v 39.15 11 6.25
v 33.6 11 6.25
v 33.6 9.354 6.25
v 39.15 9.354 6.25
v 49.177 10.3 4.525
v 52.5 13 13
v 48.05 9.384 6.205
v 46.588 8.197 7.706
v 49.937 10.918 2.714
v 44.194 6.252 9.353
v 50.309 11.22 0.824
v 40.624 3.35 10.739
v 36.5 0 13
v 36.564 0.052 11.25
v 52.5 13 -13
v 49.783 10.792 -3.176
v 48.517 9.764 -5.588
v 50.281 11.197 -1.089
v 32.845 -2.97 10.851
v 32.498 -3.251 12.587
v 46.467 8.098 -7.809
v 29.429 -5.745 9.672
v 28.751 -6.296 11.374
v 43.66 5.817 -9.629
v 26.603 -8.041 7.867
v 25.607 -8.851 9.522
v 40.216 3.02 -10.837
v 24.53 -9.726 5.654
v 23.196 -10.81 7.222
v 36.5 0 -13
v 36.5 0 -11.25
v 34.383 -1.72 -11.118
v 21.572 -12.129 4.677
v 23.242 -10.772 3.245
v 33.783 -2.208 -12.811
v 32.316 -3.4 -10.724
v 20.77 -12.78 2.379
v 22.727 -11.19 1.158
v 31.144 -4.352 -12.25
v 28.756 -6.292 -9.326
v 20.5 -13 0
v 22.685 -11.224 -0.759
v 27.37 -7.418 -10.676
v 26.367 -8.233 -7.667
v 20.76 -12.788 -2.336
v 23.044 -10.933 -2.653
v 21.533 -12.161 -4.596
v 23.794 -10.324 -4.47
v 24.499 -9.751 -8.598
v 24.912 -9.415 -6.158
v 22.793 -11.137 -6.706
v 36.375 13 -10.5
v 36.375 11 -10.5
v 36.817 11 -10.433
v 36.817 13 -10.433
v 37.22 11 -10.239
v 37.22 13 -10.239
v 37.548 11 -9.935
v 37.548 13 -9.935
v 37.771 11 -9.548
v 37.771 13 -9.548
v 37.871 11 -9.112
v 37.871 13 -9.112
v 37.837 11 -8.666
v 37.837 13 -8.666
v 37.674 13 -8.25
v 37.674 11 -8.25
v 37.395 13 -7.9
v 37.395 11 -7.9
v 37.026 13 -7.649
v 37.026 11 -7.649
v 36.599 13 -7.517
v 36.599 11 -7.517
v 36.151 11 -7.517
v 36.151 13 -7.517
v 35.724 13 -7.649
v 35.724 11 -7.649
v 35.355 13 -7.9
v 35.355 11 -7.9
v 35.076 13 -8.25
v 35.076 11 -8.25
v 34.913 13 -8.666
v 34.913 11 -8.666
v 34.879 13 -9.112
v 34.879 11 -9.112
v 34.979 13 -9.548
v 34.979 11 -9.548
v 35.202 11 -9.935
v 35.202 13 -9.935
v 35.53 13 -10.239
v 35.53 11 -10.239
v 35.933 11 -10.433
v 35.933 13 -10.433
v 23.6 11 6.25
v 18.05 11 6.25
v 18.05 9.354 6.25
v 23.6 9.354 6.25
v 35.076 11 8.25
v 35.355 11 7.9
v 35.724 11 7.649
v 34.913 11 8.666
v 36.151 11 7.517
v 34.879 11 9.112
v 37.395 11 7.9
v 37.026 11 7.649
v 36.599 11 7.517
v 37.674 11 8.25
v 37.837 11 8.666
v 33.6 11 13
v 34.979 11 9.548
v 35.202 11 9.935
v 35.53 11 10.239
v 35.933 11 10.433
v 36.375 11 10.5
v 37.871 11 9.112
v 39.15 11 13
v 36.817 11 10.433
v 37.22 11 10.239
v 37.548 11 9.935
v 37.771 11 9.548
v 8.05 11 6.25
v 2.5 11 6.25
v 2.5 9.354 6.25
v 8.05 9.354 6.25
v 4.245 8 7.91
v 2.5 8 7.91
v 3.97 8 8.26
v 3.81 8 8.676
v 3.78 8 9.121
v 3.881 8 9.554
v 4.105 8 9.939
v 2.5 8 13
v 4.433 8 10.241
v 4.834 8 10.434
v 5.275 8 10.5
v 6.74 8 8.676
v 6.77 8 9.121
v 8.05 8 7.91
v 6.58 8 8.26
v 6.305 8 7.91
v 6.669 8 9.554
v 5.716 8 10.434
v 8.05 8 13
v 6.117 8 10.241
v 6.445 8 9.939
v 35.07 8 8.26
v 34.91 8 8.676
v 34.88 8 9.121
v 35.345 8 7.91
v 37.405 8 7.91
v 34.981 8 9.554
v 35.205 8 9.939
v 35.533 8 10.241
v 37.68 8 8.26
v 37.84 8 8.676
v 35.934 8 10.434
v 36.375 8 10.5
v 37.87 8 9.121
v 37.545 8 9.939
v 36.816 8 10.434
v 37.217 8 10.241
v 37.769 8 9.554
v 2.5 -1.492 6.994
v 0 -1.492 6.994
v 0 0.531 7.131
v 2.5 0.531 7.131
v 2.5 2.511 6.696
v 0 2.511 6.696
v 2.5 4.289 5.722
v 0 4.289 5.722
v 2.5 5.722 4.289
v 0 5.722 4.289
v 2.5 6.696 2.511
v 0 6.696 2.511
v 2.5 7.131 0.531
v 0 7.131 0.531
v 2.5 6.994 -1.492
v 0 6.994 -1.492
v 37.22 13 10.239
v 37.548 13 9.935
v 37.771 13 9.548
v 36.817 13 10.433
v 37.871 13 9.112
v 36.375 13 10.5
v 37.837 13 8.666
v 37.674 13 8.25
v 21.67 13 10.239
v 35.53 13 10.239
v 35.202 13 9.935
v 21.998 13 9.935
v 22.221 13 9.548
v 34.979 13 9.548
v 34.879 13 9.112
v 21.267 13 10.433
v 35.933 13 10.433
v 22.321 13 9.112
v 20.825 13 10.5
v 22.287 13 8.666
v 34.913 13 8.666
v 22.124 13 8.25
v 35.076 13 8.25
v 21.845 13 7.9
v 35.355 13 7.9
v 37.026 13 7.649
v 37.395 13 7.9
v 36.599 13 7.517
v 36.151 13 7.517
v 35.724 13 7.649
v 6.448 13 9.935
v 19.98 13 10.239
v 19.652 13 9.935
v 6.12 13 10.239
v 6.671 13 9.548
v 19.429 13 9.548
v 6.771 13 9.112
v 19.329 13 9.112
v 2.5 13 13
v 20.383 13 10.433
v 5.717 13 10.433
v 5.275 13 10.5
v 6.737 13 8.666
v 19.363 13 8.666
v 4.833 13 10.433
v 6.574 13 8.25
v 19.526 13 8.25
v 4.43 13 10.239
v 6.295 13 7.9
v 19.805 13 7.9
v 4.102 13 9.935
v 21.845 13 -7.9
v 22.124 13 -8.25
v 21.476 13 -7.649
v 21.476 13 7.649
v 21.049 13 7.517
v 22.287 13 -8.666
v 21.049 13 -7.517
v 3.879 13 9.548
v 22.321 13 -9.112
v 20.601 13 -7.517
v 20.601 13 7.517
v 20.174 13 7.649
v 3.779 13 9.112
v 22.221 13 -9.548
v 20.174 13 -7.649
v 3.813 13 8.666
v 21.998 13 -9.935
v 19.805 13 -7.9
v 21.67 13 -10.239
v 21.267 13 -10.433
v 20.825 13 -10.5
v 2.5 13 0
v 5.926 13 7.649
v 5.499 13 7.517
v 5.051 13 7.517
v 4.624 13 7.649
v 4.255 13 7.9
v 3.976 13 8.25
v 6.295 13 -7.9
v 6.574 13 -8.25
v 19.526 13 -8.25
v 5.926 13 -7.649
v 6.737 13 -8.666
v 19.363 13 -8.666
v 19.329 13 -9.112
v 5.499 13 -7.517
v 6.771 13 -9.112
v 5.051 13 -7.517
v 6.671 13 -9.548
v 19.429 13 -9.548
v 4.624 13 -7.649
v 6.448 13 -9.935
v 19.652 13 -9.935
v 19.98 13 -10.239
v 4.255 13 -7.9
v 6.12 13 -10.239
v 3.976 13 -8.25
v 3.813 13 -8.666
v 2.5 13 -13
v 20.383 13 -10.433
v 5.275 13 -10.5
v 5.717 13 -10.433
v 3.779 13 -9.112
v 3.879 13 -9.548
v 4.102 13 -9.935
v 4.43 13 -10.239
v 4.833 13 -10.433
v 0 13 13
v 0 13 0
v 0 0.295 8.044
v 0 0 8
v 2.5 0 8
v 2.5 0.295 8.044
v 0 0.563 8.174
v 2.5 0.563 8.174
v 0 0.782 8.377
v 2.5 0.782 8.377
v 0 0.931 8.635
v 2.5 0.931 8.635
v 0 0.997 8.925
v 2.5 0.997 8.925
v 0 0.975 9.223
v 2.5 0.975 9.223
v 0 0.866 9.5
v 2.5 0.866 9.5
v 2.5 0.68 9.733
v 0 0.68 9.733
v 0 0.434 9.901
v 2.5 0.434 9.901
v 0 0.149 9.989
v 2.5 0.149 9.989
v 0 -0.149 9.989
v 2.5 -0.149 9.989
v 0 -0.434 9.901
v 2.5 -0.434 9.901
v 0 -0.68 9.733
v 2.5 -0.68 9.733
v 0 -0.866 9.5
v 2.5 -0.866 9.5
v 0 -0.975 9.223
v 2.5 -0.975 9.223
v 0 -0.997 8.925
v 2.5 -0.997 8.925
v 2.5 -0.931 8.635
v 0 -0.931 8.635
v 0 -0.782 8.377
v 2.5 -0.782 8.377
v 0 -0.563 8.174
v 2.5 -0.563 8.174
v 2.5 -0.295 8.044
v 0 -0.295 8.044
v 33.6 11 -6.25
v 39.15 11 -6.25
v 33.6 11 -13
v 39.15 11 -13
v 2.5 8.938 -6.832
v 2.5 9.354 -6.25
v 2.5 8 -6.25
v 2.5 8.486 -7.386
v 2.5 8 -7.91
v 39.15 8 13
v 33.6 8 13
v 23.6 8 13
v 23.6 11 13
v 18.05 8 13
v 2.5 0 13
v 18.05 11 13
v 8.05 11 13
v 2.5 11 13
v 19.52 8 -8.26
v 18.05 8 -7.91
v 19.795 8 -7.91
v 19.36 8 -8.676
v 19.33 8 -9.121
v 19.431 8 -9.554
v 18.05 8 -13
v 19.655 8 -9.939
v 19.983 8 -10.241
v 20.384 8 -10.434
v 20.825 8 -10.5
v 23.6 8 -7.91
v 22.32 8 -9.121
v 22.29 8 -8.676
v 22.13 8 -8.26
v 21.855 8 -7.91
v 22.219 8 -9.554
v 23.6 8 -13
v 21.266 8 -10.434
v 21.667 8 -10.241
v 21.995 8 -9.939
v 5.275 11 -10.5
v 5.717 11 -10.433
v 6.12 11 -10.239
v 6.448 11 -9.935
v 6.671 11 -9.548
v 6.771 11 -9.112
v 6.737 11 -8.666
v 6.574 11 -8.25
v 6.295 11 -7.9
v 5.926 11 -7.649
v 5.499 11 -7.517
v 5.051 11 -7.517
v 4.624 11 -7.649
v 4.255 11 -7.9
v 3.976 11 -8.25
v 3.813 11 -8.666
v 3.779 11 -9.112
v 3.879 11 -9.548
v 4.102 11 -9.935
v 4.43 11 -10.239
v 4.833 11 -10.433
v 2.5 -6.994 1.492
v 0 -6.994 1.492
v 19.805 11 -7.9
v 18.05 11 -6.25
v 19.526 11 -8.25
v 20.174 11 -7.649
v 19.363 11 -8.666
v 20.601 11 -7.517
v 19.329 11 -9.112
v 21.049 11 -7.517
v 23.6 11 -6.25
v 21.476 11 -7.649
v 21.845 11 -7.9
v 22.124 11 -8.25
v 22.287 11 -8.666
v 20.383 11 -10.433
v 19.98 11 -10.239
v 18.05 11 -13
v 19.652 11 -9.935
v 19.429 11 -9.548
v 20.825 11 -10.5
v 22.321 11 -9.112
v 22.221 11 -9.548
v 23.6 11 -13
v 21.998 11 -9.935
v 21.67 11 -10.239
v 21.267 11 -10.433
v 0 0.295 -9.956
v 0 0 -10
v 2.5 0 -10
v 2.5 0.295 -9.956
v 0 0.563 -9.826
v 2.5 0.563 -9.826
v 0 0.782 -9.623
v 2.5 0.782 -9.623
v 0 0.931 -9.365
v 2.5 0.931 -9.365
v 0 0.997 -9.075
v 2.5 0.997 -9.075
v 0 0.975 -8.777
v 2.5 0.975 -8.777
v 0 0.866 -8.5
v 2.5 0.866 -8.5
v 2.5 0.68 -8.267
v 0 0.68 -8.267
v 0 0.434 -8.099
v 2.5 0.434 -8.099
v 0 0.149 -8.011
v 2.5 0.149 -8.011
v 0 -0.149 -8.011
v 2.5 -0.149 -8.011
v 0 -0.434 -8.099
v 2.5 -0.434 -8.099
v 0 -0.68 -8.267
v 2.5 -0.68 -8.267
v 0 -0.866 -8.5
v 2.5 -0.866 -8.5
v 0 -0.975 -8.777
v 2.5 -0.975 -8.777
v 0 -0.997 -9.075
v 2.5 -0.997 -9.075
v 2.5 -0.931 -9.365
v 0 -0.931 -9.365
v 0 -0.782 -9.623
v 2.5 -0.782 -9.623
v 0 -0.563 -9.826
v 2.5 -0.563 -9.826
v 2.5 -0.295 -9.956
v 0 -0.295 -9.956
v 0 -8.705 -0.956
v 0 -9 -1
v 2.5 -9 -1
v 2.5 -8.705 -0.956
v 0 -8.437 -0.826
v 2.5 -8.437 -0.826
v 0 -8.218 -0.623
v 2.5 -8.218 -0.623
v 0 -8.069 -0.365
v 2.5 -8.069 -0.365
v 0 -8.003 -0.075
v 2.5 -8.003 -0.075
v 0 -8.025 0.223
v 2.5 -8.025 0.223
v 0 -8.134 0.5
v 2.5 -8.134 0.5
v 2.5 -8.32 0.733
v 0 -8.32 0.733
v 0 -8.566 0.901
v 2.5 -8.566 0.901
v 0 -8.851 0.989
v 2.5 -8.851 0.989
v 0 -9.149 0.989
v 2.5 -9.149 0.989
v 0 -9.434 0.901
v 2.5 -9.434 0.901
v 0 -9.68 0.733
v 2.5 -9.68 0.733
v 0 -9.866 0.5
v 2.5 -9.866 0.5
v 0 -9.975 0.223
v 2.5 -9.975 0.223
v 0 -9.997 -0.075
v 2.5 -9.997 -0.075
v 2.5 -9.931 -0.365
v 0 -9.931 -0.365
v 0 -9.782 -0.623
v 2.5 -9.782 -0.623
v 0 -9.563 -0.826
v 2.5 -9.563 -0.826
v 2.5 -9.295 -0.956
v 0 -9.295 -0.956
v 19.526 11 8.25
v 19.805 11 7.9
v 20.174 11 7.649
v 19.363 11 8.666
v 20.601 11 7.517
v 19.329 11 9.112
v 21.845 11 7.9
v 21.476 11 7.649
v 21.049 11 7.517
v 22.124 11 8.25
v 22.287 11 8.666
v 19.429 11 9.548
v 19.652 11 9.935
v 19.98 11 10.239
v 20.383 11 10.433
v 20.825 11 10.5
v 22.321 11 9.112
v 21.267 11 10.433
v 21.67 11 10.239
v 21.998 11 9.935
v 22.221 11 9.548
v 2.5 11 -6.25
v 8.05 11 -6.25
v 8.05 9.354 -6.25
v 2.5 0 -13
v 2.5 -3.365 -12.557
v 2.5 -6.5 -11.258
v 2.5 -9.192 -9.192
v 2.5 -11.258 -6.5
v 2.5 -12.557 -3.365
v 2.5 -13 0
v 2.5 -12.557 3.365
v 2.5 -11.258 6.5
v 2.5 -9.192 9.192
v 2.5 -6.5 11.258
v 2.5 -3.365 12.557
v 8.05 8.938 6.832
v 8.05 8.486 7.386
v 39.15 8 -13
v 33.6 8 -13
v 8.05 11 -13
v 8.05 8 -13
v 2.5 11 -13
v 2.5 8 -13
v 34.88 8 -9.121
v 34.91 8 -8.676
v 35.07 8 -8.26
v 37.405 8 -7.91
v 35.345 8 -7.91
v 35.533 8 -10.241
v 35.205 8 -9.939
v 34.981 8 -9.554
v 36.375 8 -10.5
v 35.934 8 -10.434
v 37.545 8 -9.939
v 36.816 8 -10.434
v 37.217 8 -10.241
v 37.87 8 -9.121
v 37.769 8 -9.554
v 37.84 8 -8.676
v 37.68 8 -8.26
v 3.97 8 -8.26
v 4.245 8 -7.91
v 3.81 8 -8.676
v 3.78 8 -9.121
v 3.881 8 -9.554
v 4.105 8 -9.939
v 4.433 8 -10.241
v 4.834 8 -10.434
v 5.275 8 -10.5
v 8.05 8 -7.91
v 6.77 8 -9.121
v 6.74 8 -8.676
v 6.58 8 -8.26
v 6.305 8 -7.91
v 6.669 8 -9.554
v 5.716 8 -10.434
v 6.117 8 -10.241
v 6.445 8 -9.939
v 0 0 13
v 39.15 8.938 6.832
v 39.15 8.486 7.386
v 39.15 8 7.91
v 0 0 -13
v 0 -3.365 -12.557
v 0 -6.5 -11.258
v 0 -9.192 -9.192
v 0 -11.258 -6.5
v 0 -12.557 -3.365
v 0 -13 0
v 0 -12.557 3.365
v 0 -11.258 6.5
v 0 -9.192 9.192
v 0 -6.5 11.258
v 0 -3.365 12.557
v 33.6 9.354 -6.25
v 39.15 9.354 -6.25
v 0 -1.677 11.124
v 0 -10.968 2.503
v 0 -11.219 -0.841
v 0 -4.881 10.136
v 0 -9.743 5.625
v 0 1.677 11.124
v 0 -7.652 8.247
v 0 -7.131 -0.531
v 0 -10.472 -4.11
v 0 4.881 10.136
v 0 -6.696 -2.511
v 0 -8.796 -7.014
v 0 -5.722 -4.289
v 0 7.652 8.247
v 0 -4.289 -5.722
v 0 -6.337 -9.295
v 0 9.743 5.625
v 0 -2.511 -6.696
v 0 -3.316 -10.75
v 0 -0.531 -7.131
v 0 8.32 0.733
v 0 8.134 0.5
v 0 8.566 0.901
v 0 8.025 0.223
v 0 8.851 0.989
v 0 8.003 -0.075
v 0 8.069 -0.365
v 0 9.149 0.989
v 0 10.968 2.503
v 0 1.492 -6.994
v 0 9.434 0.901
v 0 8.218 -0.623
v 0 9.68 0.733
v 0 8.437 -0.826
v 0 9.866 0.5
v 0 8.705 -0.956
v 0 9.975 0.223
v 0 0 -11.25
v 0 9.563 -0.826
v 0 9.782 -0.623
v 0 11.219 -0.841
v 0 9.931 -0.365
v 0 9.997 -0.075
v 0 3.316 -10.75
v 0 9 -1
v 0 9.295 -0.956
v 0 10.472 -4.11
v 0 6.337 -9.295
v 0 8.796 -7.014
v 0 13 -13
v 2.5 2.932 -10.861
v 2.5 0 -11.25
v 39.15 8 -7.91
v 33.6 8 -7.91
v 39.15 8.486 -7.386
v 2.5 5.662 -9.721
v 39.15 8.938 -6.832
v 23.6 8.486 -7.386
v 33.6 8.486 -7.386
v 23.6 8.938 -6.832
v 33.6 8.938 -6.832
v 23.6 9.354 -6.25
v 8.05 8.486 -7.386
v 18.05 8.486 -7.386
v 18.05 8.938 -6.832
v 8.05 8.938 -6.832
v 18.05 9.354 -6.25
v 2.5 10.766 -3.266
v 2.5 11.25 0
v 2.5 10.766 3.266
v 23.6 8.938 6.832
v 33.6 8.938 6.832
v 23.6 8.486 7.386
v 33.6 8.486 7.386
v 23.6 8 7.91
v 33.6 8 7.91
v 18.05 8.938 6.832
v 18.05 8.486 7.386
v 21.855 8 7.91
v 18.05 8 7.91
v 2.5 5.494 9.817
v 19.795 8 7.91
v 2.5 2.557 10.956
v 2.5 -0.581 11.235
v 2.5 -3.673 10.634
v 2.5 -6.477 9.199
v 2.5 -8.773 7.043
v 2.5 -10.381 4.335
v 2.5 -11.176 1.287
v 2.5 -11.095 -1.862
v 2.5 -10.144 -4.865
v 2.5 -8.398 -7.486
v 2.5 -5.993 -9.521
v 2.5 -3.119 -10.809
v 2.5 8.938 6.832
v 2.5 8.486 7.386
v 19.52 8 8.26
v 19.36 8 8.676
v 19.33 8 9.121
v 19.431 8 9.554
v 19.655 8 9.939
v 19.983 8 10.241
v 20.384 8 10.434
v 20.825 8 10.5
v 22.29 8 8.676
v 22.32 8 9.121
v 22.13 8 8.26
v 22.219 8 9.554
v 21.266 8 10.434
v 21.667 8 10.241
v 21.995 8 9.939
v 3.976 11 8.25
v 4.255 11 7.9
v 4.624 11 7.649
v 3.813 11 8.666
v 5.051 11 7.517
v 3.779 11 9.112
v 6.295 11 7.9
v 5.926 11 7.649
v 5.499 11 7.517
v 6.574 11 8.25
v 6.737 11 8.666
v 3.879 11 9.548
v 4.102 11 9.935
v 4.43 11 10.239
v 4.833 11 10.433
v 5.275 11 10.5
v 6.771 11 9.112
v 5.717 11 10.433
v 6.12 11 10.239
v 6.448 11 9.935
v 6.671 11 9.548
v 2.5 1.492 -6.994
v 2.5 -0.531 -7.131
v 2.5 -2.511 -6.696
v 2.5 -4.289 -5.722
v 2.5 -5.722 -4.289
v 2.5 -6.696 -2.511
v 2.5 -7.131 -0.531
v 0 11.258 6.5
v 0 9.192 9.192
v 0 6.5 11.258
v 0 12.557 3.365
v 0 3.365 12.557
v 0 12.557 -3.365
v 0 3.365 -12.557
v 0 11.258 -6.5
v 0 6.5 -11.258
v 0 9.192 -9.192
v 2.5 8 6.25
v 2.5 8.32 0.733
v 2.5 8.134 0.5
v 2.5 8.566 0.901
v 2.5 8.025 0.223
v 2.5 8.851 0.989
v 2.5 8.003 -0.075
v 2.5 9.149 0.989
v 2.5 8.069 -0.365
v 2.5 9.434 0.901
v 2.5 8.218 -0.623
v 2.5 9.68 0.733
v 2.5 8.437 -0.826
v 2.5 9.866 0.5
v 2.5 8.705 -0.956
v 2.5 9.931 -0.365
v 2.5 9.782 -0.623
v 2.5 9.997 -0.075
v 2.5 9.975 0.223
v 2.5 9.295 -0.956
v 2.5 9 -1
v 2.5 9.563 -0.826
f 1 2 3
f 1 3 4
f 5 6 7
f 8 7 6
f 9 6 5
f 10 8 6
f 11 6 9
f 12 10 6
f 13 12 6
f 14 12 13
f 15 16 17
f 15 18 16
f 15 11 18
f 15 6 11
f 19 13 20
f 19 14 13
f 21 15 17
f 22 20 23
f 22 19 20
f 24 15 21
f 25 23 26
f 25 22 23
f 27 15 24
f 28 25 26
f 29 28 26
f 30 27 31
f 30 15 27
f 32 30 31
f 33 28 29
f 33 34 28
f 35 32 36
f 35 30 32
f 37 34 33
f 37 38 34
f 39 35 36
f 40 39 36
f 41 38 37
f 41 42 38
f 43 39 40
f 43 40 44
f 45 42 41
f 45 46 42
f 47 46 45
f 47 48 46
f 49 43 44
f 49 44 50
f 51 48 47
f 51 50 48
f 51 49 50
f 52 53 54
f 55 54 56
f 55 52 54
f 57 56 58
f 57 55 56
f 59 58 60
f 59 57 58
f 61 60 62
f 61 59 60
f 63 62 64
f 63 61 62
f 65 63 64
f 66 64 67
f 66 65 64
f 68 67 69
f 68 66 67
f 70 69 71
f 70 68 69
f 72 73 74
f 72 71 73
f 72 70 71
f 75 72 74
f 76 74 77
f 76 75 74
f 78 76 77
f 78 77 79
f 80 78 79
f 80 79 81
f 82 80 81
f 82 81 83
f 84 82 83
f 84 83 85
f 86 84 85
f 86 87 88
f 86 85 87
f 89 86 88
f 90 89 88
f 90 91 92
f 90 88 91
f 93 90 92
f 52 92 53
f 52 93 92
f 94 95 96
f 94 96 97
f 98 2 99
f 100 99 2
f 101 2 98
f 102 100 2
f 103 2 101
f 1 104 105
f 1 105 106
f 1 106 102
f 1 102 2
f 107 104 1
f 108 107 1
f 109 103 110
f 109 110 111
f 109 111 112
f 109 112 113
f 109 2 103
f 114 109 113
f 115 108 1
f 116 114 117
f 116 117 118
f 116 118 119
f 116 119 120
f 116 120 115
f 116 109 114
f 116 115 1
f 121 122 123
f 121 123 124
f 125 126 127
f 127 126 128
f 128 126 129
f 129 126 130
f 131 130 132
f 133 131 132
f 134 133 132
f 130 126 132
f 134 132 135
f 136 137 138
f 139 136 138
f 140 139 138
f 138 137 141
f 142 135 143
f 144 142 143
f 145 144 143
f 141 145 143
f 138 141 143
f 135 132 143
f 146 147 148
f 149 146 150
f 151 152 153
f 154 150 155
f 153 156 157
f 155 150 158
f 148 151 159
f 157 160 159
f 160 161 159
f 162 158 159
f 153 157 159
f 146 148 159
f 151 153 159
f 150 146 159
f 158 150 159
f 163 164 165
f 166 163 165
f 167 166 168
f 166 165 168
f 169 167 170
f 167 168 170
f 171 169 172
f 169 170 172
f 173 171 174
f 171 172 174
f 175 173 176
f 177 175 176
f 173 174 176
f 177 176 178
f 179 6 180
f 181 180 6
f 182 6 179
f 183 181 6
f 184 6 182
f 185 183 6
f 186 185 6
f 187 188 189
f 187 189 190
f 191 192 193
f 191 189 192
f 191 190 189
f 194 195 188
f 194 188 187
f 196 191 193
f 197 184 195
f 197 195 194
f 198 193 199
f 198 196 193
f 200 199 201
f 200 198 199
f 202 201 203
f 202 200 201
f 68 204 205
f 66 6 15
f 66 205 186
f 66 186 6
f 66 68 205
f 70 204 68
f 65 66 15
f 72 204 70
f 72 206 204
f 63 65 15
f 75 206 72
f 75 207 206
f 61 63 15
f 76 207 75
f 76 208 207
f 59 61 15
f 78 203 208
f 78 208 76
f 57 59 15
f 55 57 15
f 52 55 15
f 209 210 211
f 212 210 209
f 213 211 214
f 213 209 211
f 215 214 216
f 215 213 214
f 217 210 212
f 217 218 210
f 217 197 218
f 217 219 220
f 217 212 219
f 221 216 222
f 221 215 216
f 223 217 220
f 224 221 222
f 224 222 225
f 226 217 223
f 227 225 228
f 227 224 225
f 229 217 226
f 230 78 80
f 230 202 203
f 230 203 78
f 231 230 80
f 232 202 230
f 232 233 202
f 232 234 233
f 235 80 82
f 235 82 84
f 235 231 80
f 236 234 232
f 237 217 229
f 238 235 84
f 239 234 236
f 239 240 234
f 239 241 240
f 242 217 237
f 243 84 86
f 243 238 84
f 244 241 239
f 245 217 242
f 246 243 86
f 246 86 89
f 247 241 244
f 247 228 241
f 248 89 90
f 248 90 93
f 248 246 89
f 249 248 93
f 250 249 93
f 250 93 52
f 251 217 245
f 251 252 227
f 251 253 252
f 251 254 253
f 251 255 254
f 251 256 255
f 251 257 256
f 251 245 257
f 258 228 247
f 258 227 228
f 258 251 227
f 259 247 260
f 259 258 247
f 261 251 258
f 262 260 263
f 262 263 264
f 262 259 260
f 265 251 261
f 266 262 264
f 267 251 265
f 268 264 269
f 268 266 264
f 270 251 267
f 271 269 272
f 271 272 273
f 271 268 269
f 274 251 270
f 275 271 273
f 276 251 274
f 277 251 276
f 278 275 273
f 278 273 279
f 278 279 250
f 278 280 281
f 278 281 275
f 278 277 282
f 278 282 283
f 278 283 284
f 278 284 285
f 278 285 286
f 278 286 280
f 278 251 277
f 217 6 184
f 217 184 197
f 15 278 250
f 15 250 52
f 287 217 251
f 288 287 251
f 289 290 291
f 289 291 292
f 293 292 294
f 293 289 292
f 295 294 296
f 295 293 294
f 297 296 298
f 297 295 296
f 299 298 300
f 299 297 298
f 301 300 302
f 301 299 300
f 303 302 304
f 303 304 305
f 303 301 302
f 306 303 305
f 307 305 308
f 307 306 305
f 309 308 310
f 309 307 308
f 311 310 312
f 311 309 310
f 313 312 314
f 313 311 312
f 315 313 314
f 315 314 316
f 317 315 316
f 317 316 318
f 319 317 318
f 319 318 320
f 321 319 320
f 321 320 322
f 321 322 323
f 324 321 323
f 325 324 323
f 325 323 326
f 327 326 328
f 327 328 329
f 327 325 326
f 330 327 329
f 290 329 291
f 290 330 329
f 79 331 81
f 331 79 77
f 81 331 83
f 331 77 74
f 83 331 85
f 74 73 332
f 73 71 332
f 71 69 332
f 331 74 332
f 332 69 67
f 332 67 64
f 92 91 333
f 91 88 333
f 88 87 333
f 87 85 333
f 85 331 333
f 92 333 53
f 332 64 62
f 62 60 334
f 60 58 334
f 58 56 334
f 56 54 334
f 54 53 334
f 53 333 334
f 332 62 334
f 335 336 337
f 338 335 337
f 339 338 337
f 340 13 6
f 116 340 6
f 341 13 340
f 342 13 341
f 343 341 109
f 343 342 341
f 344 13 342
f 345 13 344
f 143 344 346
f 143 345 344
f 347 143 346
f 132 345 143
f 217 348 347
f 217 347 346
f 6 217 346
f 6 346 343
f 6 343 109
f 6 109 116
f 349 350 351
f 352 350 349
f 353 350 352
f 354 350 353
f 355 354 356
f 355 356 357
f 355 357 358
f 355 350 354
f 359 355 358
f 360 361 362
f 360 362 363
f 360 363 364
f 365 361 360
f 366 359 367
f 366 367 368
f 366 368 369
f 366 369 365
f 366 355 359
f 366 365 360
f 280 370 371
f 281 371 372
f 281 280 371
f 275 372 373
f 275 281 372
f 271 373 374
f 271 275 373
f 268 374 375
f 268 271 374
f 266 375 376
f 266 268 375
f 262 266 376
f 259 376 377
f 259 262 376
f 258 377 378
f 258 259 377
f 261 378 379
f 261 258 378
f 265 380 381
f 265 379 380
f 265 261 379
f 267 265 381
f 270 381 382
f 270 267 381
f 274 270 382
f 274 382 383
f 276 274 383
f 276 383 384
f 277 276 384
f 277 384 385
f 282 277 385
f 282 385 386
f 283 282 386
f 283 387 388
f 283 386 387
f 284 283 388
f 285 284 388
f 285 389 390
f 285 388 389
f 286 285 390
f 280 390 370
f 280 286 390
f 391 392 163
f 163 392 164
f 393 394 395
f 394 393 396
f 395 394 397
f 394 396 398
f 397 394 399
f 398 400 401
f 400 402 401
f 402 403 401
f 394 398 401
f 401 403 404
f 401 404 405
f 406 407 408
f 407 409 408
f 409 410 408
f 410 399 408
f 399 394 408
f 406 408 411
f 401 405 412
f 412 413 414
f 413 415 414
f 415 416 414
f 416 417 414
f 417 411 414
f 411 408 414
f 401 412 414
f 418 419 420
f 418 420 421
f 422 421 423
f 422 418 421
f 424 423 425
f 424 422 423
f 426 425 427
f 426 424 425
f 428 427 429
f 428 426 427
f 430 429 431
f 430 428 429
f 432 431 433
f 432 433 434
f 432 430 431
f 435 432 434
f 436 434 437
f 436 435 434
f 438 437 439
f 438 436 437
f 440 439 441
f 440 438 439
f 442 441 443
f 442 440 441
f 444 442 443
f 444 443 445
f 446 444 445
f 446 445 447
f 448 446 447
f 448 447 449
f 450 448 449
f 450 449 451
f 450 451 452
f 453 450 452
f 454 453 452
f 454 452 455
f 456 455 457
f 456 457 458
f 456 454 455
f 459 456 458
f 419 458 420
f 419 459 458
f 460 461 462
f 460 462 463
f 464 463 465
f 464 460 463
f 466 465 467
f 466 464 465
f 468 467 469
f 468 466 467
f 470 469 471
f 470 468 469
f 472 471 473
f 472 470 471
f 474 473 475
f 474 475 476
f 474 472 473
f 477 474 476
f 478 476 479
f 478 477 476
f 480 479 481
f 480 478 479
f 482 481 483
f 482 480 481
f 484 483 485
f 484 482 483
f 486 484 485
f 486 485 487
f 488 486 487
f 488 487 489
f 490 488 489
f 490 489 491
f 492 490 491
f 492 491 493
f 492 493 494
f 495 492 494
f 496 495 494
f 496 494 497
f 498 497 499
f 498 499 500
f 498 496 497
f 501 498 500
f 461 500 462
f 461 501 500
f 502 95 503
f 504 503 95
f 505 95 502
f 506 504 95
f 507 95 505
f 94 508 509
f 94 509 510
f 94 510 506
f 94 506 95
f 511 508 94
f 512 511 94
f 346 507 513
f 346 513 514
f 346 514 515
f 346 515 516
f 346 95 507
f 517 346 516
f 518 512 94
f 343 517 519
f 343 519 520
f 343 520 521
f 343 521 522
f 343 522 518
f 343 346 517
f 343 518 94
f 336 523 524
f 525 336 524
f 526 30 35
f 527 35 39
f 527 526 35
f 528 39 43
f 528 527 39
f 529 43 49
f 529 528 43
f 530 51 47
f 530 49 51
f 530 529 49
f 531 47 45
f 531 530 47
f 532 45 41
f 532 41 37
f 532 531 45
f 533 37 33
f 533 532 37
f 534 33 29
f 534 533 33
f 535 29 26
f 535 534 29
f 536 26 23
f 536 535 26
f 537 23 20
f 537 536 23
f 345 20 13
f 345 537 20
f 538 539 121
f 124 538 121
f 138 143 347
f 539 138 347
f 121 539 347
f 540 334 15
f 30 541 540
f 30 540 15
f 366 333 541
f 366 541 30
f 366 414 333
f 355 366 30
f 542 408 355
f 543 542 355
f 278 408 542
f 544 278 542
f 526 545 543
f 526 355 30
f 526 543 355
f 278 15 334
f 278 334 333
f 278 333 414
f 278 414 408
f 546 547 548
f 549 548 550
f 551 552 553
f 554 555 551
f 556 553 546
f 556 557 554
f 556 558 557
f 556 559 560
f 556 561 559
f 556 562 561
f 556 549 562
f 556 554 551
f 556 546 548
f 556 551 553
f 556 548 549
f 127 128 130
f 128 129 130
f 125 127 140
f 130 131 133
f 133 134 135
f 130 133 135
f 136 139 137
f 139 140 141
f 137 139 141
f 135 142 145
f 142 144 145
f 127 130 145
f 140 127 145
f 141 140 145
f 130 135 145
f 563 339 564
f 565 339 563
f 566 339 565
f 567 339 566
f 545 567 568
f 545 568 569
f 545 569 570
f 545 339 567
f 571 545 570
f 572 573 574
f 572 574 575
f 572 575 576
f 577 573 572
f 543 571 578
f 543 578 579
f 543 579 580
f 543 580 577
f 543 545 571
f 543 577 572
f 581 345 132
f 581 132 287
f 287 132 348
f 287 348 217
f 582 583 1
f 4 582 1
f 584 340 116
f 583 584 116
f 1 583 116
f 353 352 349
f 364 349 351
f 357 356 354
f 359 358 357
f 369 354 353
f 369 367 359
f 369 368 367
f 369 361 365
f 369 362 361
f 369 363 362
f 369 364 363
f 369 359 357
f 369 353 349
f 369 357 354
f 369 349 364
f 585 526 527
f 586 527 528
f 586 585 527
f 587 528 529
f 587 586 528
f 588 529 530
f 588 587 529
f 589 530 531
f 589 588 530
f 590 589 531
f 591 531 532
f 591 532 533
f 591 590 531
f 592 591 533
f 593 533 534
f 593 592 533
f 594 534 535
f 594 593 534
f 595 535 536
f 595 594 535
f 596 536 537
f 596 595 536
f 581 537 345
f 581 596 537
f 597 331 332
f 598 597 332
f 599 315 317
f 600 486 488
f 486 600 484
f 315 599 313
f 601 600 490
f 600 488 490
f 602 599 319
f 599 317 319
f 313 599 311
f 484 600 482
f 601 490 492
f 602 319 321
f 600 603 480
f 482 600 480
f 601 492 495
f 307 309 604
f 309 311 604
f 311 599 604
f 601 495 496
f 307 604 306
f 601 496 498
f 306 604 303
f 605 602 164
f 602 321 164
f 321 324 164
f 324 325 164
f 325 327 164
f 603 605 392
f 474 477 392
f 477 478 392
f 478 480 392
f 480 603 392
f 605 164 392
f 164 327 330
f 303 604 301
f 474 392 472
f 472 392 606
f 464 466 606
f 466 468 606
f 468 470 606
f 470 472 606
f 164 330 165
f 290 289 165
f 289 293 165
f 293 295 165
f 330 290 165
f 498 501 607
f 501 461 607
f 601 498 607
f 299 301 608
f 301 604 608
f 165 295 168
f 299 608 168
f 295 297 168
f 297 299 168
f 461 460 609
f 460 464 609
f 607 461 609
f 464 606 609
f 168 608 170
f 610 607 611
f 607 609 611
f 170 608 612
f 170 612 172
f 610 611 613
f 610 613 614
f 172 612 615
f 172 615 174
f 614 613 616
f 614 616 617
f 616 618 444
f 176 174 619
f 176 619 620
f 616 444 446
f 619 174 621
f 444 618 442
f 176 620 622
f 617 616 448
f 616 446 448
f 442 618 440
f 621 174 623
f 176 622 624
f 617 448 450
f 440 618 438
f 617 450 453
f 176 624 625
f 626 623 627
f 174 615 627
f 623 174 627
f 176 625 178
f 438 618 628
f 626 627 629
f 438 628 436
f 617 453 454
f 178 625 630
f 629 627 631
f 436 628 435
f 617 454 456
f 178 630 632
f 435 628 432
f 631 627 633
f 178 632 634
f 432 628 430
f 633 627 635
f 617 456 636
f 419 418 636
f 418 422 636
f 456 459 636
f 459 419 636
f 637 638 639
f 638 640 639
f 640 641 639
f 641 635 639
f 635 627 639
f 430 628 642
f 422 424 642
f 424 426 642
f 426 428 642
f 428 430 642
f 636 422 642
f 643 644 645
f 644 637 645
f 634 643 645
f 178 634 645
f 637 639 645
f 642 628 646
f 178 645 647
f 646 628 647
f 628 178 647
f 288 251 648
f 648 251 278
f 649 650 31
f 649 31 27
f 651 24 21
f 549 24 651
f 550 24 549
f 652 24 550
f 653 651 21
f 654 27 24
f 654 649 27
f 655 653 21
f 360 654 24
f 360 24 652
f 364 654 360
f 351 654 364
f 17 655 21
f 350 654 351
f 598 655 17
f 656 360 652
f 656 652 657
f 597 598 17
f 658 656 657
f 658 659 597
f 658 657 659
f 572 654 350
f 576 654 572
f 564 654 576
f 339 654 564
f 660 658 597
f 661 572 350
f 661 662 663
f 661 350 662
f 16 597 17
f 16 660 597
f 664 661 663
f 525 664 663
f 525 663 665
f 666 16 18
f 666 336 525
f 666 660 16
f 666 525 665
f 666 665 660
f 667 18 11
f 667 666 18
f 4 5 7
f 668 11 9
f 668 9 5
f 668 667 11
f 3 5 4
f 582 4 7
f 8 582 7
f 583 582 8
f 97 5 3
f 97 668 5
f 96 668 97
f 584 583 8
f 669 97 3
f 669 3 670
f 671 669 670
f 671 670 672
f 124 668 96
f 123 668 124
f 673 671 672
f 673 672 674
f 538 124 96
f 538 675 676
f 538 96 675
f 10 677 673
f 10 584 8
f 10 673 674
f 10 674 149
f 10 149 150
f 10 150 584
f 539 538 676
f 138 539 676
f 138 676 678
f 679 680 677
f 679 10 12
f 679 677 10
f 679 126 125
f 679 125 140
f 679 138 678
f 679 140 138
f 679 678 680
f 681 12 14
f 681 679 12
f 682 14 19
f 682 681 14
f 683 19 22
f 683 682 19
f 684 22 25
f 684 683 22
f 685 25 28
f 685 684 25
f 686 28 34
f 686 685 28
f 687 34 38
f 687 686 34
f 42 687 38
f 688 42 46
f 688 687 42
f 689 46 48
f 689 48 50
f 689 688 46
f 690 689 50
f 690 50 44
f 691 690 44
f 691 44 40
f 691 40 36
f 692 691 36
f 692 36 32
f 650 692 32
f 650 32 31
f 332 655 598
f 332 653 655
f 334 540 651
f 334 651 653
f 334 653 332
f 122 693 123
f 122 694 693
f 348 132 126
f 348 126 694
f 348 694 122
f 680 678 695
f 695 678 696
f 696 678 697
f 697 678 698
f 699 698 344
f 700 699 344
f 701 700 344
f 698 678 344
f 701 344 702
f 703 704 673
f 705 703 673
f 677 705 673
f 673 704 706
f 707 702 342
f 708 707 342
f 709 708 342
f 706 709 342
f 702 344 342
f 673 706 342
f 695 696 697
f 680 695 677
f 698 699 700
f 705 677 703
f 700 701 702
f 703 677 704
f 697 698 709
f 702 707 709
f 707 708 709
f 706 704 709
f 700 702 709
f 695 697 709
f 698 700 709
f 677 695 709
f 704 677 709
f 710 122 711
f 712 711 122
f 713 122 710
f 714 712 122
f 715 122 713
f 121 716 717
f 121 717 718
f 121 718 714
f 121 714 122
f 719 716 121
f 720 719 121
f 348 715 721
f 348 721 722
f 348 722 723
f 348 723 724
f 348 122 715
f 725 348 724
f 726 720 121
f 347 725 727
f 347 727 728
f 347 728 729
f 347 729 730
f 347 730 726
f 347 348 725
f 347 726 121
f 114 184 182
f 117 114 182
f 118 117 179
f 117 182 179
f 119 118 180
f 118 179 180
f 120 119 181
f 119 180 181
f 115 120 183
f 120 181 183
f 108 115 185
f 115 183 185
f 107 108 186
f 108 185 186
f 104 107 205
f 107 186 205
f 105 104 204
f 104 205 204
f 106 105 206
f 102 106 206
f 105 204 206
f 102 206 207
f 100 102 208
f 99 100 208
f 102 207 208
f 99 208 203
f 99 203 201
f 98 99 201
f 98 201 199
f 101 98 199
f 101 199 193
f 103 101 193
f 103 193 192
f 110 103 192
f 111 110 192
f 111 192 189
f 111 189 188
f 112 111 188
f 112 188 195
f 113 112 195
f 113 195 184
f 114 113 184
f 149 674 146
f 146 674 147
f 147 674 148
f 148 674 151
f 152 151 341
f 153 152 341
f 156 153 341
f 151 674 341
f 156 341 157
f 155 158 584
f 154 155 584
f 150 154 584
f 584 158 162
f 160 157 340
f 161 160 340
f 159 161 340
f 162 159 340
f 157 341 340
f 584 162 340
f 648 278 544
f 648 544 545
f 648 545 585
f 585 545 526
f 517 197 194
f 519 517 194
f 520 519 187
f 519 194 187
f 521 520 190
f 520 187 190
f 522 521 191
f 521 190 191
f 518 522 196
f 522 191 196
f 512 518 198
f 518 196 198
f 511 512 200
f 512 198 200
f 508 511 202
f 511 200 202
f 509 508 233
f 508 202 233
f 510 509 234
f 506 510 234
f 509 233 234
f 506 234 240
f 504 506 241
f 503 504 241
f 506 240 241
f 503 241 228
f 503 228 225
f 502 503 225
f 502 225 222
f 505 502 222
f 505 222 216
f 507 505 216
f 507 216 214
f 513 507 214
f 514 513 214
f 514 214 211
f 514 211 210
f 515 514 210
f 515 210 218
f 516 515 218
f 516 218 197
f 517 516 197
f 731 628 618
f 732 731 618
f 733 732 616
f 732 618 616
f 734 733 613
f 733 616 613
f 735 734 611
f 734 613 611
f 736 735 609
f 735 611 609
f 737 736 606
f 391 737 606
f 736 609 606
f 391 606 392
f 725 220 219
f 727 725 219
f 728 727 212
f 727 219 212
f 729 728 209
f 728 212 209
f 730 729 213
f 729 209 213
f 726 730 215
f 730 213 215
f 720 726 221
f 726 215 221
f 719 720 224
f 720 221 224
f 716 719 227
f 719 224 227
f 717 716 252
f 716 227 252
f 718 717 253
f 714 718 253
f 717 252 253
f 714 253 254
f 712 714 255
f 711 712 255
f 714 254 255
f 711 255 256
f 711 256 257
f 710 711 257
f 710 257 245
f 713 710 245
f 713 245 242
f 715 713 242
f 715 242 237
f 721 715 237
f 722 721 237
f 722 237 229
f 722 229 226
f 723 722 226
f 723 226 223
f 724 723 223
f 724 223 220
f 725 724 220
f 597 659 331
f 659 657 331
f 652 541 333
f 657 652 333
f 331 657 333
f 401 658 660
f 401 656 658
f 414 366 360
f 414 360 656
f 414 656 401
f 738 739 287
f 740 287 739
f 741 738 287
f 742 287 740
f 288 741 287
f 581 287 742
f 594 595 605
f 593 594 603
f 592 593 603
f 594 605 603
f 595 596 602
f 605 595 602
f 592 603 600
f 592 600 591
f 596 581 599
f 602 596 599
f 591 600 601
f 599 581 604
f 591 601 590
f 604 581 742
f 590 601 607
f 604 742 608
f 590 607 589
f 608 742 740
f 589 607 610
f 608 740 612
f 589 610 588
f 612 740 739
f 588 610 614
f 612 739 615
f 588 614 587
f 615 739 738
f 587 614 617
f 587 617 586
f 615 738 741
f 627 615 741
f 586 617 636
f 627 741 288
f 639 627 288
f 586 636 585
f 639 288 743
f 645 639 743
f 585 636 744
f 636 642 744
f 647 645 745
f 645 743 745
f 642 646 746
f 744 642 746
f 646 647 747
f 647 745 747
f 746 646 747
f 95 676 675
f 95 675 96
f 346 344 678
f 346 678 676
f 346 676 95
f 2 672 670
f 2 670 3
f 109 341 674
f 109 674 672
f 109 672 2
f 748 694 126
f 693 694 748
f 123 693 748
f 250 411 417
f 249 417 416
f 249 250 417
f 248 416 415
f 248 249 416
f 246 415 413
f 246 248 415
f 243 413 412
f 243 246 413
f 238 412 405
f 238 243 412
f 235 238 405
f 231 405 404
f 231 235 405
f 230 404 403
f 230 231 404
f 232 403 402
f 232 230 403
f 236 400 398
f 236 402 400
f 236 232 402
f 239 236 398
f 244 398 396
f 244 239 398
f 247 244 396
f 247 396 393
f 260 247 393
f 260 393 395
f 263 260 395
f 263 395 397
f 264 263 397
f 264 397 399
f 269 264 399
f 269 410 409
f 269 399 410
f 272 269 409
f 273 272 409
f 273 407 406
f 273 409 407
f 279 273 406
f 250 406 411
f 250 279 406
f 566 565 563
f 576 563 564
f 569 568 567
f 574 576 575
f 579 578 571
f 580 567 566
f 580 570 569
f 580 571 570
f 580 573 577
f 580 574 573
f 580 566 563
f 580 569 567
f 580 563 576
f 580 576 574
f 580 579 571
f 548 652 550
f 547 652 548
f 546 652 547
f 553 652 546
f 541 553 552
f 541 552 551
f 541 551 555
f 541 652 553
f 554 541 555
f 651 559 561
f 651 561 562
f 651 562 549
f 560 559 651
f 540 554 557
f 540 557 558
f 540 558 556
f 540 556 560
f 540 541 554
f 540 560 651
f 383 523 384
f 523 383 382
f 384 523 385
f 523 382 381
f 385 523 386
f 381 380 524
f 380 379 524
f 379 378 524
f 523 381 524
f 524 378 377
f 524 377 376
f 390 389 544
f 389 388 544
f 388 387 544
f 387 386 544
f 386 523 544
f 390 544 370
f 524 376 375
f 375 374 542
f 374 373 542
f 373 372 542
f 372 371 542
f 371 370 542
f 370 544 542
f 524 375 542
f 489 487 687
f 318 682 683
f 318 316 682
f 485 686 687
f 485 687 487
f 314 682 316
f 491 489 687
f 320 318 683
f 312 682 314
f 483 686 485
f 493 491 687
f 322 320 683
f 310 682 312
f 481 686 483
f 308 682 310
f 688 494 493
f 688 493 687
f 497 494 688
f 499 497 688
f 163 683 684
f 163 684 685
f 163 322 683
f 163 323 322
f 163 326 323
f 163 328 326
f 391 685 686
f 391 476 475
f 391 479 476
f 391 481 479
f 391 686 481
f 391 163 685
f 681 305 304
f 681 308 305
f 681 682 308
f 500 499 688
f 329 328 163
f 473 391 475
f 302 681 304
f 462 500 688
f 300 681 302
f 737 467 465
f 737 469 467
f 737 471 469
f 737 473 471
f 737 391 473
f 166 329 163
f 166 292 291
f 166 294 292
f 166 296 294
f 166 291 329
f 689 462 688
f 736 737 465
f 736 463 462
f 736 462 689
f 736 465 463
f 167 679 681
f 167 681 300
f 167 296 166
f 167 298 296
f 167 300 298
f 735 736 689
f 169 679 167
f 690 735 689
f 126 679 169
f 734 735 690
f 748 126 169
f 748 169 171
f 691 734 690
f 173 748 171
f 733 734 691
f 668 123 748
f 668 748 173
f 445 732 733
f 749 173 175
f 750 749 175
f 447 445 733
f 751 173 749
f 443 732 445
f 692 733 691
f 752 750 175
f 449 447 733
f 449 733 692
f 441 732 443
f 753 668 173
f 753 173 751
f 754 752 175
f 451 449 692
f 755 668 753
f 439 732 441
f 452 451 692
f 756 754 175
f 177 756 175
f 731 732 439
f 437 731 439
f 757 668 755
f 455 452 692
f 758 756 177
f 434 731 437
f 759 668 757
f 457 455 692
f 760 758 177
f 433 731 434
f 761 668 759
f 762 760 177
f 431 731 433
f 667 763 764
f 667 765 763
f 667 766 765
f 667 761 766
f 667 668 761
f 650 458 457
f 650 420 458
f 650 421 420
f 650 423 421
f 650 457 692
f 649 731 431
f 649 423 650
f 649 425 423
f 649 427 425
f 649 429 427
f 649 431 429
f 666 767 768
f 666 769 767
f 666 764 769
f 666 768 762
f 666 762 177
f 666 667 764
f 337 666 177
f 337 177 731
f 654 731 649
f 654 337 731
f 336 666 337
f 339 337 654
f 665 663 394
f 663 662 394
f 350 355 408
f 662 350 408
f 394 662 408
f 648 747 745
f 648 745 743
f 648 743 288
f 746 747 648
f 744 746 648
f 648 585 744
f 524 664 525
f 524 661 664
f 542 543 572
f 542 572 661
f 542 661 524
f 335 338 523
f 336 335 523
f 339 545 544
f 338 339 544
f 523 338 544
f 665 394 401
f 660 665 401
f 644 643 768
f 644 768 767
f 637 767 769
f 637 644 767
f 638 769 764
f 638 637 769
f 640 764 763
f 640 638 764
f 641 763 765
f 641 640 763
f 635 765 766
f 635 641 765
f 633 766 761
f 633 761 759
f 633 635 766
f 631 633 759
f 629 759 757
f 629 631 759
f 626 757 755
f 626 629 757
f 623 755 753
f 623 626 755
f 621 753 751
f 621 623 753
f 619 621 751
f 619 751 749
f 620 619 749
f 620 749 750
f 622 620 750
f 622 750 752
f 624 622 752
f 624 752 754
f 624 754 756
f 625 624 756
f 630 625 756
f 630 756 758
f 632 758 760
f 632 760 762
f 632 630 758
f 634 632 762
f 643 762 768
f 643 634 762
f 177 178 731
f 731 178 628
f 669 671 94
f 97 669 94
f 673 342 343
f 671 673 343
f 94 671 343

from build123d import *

# Parameters (mm, degrees)
SKETCH1_R                       = 13
SKETCH1_R_2                     = 1
BOSS_EXTRUDE1_DEPTH             = 2.5
SKETCH2_R                       = 11.25
BOSS_EXTRUDE2_DEPTH             = 50
BOSS_EXTRUDE2_DIRECTION_2_REACH = 20.554
CUT_EXTRUDE1_DEPTH              = 56.625983137
CUT_EXTRUDE1_DEPTH_BACK         = 56.625983137
SKETCH4_W                       = 5.55
SKETCH4_H                       = 3
CUT_EXTRUDE2_DEPTH              = 6.75
SKETCH5_R                       = 1.5
CUT_EXTRUDE3_DEPTH              = 5


with BuildPart() as part:
    # Sketch1 → Boss-Extrude1 (new body)
    with BuildSketch(Plane(origin=(0, 0, 0), x_dir=(0, 0, -1), z_dir=(1, 0, 0))):
        Circle(SKETCH1_R)
        with Locations((0, 9)):
            Circle(SKETCH1_R_2, mode=Mode.SUBTRACT)
        with Locations((9, 0)):
            Circle(SKETCH1_R_2, mode=Mode.SUBTRACT)
        with Locations((0, -9)):
            Circle(SKETCH1_R_2, mode=Mode.SUBTRACT)
        with Locations((-9, 0)):
            Circle(SKETCH1_R_2, mode=Mode.SUBTRACT)
        with BuildLine():
            Line((1.491573557, 6.993707817), (6.993707817, 1.491573557))
            ThreePointArc((6.993707817, 1.491573557), (5.056517611, -5.056517611), (-1.491573557, -6.993707817))
            Line((-1.491573557, -6.993707817), (-6.993707817, -1.491573557))
            ThreePointArc((-6.993707817, -1.491573557), (-5.056517611, 5.056517611), (1.491573557, 6.993707817))
        make_face(mode=Mode.SUBTRACT)
    extrude(amount=BOSS_EXTRUDE1_DEPTH)

    # Sketch2 → Boss-Extrude2 (add)
    with BuildSketch(Plane(origin=(2.5, 0, 0), x_dir=(0, 0, -1), z_dir=(1, 0, 0))):
        with BuildLine():
            Line((-13, 13), (13, 13))
            Line((13, 13), (13, 0))
            ThreePointArc((13, 0), (0, -13), (-13, 0))
            Line((-13, 0), (-13, 13))
        make_face()
        Circle(SKETCH2_R, mode=Mode.SUBTRACT)
    extrude(amount=BOSS_EXTRUDE2_DEPTH)

    # Boss-Extrude2 direction 2: up to this face of the body (flat: up to its plane)
    boss_extrude2_direction_2_end = Plane(part.part.faces().sort_by_distance((0, 0, 12.632304474))[0])
    # Sketch2 → Boss-Extrude2 direction 2 (add, up to the picked face)
    with BuildSketch(Plane(origin=(2.5, 0, 0), x_dir=(0, 0, -1), z_dir=(1, 0, 0)), mode=Mode.PRIVATE) as boss_extrude2_direction_2_sk1:
        with BuildLine():
            Line((-13, 13), (13, 13))
            Line((13, 13), (13, 0))
            ThreePointArc((13, 0), (0, -13), (-13, 0))
            Line((-13, 0), (-13, 13))
        make_face()
        Circle(SKETCH2_R, mode=Mode.SUBTRACT)
    boss_extrude2_direction_2_tool1 = split(extrude(boss_extrude2_direction_2_sk1.sketch, amount=-BOSS_EXTRUDE2_DIRECTION_2_REACH, mode=Mode.PRIVATE), bisect_by=boss_extrude2_direction_2_end, keep=Keep.BOTH, mode=Mode.PRIVATE)
    add(boss_extrude2_direction_2_tool1.solids().sort_by(Axis((2.5, 6.5, 12.632304), (-1, 0, 0)))[0])

    # Sketch3 → Cut-Extrude1 (cut, two sides: drawn at the far end of the back side and taken through both)
    with BuildSketch(Plane.XY.offset(-CUT_EXTRUDE1_DEPTH_BACK)):
        Polygon((52.5, 13), (20.5, -13), (52.5, -13), align=None)
    extrude(amount=CUT_EXTRUDE1_DEPTH + CUT_EXTRUDE1_DEPTH_BACK, mode=Mode.SUBTRACT)

    # Sketch4 → Cut-Extrude2 (cut)
    with BuildSketch(Plane.XY.offset(13)):
        with Locations((5.275, 9.5)):
            Rectangle(SKETCH4_W, SKETCH4_H)
        with Locations((20.825, 9.5)):
            Rectangle(SKETCH4_W, SKETCH4_H)
        with Locations((36.375, 9.5)):
            Rectangle(SKETCH4_W, SKETCH4_H)
    cut_extrude2 = extrude(amount=-CUT_EXTRUDE2_DEPTH, mode=Mode.SUBTRACT)

    # Sketch5 → Cut-Extrude3 (cut)
    with BuildSketch(Plane(origin=(0, 13, 0), x_dir=(1, 0, 0), z_dir=(0, 1, 0))):
        with Locations(Location((5.275, -9, 0), (0, 0, 270))):
            Circle(SKETCH5_R)
        with Locations(Location((20.825, -9, 0), (0, 0, 270))):
            Circle(SKETCH5_R)
        with Locations(Location((36.375, -9, 0), (0, 0, 270))):
            Circle(SKETCH5_R)
    cut_extrude3 = extrude(amount=-CUT_EXTRUDE3_DEPTH, mode=Mode.SUBTRACT)

    # Mirror1: Cut-Extrude2, Cut-Extrude3 across plane
    add(cut_extrude2.mirror(Plane.XY), mode=Mode.SUBTRACT)
    add(cut_extrude3.mirror(Plane.XY), mode=Mode.SUBTRACT)


solid = part.part
